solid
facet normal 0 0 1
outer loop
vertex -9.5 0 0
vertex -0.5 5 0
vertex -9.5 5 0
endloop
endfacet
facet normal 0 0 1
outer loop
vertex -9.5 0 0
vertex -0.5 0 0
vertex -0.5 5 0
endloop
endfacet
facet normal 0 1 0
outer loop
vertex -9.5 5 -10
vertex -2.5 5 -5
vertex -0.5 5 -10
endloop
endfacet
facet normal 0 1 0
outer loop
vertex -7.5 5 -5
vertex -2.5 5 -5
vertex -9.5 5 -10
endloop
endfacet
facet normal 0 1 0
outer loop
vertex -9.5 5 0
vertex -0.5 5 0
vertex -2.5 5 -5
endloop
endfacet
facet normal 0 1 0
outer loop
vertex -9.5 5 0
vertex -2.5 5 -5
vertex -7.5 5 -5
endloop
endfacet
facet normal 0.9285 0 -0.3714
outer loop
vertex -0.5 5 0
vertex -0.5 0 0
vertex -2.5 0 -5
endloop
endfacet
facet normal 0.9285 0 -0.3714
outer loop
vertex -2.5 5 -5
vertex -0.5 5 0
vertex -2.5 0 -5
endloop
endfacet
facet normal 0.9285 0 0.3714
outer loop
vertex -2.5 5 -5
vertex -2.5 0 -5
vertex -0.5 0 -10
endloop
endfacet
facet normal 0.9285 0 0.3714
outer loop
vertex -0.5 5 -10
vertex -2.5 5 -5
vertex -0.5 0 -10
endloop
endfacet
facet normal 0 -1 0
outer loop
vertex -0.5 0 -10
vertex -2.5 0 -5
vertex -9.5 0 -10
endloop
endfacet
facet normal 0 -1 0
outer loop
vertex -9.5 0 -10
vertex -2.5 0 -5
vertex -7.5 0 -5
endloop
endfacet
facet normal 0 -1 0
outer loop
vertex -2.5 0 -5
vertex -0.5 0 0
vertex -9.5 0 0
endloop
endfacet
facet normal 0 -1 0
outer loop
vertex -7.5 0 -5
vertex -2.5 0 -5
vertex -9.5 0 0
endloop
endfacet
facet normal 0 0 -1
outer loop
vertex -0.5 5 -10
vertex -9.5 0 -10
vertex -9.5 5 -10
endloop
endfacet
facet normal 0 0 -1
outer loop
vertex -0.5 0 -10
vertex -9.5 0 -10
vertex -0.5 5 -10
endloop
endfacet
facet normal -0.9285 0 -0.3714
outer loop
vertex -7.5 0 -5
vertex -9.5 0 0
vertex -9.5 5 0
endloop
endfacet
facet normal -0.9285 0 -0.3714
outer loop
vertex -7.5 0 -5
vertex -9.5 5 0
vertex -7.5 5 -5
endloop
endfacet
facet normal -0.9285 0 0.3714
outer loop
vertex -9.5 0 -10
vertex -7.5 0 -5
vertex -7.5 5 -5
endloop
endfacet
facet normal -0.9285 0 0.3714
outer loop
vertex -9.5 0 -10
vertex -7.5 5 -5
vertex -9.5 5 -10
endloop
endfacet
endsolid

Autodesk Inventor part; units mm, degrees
ref_plane "YZ Plane" through (0, 0, 0) normal (1, 0, 0) x (0, 1, 0)
ref_plane "XZ Plane" through (0, 0, 0) normal (0, 1, 0) x (-1, 0, 0)
ref_plane "XY Plane" through (0, 0, 0) normal (0, 0, 1) x (1, 0, 0)
sketch "Sketch1" plane through (0, 0, 0) normal (0, 1, 0) x (-1, 0, 0)
  line L0 (0, 0) -> (10, 0)
  line L1 (5, 0) -> (5, -10)
  line L2 (10, -10) -> (0, -10)
  line L3 (5, -5) -> (7.5, -5)
  line L4 (7.5, -5) -> (10, 0)
  line L5 (7.5, -5) -> (10, -10)
  line L6 (5, -5) -> (2.5, -5)
  line L7 (2.5, -5) -> (0, -10)
  line L8 (2.5, -5) -> (0, 0)
  line L9 (5, 0) -> (9.5, 0)
  line L10 (9.5, 0) -> (7.5, -5)
  line L11 (5, 0) -> (0.5, 0)
  line L12 (0.5, 0) -> (2.5, -5)
  line L13 (2.5, -5) -> (0.5, -10)
  line L14 (7.5, -5) -> (9.5, -10)
  dimension "d0" = 10
  dimension "d1" = 10
  dimension "d2" = 2.5
  dimension "d3" = 2.5
  dimension "d4" = 4.5
  dimension "d5" = 4.5
extrude "Extrusion1" add sketch "Sketch1" along normal blind 5 contours L0 L1 L6 L12 | L6 L1 L2 L13 | L0 L10 L3 L1 | L3 L14 L2 L1
properties part number "dishConnector_3DPrint"
